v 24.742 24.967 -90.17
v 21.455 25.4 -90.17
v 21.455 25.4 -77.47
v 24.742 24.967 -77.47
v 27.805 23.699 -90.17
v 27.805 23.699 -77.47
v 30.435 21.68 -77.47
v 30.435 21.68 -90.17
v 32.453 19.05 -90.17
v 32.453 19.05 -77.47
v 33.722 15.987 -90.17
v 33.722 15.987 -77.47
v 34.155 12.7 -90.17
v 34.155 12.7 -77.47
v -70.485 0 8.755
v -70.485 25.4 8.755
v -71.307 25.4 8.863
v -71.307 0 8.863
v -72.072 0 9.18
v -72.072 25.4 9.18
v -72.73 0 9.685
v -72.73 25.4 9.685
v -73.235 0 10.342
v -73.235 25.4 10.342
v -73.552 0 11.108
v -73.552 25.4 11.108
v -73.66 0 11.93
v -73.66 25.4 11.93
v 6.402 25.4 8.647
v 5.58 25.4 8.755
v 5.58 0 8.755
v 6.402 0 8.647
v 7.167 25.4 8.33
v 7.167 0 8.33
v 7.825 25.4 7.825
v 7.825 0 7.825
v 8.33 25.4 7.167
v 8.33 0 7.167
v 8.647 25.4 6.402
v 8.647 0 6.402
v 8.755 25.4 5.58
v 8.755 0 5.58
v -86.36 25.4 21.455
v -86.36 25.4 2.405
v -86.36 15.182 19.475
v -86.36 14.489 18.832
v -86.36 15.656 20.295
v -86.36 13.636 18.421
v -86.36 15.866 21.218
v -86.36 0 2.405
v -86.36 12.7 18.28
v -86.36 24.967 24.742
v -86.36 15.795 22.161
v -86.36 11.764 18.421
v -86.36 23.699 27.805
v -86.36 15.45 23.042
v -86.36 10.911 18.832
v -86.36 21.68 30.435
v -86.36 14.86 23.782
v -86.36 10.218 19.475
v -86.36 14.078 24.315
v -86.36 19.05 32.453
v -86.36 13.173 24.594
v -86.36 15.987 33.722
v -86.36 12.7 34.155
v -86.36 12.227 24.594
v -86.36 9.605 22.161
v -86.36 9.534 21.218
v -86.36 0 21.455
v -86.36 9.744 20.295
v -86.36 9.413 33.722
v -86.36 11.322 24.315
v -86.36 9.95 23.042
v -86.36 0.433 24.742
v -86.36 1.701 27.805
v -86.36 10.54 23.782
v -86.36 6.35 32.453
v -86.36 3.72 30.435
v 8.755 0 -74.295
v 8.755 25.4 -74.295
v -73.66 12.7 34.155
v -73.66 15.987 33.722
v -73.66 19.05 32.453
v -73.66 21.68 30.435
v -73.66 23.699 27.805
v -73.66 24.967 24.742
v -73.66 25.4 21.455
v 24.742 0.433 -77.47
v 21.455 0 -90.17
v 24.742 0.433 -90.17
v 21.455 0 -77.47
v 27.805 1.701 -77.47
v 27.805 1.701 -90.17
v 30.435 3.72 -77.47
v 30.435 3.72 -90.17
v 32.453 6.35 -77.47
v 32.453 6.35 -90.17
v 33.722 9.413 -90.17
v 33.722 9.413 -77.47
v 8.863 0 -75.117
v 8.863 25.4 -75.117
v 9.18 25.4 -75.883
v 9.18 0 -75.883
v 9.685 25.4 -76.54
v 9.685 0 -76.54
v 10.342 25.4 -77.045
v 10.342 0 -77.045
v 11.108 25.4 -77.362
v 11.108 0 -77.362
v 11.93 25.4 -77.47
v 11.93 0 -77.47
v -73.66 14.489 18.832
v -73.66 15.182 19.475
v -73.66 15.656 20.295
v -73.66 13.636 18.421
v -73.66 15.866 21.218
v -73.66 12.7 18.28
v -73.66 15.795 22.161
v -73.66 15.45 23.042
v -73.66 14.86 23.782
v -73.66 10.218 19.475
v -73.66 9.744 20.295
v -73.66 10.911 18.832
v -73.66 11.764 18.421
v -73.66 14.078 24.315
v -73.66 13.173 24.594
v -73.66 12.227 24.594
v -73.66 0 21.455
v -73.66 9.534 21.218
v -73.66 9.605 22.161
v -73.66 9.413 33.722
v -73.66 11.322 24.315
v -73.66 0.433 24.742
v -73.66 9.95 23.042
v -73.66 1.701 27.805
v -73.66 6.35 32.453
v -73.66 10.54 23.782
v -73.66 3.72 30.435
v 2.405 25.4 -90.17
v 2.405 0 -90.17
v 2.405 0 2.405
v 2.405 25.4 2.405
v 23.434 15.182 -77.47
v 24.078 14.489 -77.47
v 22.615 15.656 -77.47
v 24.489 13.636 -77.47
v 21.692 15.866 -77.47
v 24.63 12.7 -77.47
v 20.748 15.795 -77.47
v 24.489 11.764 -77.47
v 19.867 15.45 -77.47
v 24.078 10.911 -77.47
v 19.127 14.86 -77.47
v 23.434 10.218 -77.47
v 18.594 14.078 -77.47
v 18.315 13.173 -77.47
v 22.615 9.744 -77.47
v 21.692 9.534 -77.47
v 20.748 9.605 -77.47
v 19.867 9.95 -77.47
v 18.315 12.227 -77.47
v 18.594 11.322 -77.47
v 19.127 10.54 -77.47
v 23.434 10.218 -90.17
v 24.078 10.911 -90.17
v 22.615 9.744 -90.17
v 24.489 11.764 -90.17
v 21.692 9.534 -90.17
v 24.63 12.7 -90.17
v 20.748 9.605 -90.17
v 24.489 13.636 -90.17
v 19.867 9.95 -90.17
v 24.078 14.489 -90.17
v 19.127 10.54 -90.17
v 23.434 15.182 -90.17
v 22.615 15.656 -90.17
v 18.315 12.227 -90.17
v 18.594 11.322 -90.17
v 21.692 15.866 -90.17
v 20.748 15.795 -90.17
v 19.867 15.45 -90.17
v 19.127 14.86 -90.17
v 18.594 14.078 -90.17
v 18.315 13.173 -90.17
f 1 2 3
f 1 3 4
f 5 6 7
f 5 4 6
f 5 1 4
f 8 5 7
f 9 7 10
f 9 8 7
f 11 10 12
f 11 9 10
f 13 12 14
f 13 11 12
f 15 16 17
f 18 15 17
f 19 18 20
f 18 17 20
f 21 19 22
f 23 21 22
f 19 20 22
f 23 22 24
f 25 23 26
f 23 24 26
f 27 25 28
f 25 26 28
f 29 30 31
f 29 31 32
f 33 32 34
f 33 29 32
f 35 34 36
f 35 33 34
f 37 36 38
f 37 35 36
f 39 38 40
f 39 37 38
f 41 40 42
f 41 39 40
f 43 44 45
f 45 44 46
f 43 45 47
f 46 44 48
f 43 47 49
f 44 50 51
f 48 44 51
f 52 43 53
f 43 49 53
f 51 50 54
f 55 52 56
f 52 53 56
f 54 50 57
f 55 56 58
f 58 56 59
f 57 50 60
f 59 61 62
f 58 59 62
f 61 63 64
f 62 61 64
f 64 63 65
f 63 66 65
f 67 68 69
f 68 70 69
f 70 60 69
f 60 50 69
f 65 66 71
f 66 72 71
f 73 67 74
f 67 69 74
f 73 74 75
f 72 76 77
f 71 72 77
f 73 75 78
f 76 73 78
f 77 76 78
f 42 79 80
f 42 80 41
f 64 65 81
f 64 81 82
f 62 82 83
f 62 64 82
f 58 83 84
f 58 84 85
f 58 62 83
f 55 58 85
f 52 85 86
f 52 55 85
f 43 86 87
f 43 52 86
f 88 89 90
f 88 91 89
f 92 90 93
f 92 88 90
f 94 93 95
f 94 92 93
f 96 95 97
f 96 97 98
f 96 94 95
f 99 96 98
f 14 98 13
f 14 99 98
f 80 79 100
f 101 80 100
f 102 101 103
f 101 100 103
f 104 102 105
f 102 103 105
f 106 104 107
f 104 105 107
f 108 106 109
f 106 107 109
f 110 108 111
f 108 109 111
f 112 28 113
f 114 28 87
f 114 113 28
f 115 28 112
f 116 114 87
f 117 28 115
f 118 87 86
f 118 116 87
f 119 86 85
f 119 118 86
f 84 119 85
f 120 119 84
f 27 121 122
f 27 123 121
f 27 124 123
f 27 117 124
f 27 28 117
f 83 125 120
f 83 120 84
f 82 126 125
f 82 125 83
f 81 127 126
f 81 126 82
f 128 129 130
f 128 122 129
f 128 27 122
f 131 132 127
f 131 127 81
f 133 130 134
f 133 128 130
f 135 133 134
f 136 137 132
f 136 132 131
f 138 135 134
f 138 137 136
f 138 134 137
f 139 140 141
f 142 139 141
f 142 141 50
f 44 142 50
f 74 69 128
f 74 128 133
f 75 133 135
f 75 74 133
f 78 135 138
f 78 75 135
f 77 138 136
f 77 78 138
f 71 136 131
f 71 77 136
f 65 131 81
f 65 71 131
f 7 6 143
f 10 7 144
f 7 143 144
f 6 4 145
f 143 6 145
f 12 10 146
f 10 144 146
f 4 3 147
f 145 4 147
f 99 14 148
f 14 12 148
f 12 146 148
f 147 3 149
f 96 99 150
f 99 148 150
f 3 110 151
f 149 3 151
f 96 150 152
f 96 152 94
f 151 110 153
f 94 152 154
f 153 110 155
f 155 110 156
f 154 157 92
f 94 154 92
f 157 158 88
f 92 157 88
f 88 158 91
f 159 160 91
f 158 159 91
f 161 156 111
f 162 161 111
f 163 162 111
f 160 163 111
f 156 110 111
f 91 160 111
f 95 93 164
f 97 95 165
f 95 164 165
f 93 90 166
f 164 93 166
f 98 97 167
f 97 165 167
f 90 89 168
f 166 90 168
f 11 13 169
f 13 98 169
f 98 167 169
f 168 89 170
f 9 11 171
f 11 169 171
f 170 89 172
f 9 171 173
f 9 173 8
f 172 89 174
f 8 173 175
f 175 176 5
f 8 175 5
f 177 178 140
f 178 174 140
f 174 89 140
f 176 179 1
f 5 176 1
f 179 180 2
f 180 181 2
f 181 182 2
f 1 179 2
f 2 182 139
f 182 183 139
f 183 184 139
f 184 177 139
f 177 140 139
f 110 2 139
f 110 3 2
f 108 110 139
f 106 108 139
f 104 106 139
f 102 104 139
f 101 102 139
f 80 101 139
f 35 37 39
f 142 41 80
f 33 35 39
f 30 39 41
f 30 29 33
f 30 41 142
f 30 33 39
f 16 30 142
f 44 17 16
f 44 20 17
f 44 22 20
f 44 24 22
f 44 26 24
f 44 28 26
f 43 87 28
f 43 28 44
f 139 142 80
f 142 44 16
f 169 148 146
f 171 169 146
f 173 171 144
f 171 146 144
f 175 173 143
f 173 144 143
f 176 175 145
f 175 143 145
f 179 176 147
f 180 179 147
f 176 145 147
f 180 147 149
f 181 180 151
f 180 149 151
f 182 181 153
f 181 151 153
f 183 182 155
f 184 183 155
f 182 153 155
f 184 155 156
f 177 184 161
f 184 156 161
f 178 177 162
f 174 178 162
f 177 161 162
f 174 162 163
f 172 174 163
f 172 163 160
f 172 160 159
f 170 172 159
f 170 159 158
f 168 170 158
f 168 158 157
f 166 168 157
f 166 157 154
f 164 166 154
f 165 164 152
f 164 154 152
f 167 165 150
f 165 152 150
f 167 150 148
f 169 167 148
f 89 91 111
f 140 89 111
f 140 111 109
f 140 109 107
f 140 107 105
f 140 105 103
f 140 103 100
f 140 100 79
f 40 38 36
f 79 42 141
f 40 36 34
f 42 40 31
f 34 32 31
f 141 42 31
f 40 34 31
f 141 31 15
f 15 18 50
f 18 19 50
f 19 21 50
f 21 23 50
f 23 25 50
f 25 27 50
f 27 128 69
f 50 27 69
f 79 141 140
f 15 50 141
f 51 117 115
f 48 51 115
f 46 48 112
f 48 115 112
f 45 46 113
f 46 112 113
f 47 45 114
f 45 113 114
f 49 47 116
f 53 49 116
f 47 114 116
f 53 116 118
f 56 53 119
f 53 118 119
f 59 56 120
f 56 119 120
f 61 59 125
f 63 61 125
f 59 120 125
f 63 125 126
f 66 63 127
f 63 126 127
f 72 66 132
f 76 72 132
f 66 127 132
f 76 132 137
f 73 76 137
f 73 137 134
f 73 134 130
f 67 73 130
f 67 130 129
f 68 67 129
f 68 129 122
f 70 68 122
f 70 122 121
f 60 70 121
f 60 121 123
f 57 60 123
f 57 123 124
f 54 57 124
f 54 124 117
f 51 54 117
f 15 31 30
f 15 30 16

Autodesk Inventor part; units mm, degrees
ref_plane "YZ Plane" through (0, 0, 0) normal (1, 0, 0) x (0, 1, 0)
ref_plane "XZ Plane" through (0, 0, 0) normal (0, 1, 0) x (-1, 0, 0)
ref_plane "XY Plane" through (0, 0, 0) normal (0, 0, 1) x (1, 0, 0)
sketch "Sketch1" plane through (0, 0, 0) normal (0, 1, 0) x (-1, 0, 0)
  line L0 (0, 0) -> (86.36, 0)
  line L1 (86.36, 0) -> (86.36, -180.34)
  line L2 (86.36, -180.34) -> (0, -180.34)
  line L3 (0, -180.34) -> (0, 0)
  line L4 (-2.4049, 2.4049) -> (88.7649, 2.4049)
  line L5 (88.7649, 2.4049) -> (88.7649, -182.7449)
  line L6 (88.7649, -182.7449) -> (-2.4049, -182.7449)
  line L7 (-2.4049, -182.7449) -> (-2.4049, 2.4049)
  line L8 (-8.7549, 8.7549) -> (95.1149, 8.7549)
  line L9 (95.1149, 8.7549) -> (95.1149, -189.0949)
  line L10 (95.1149, -189.0949) -> (-8.7549, -189.0949)
  line L11 (-8.7549, -189.0949) -> (-8.7549, 8.7549)
  line L12 (86.36, 0) -> (86.36, 48.8454)
  line L13 (86.36, 48.8454) -> (86.36, -245.5667)
  line L14 (86.36, 8.7549) -> (73.66, 8.7549)
  line L15 (73.66, 8.7549) -> (73.66, 34.1549)
  line L16 (73.66, 34.1549) -> (86.36, 34.1549)
  line L17 (86.36, 34.1549) -> (86.36, 8.7549)
  line L18 (86.36, -189.0949) -> (73.66, -189.0949)
  line L19 (73.66, -189.0949) -> (73.66, -214.4949)
  line L20 (73.66, -214.4949) -> (86.36, -214.4949)
  line L21 (86.36, -214.4949) -> (86.36, -189.0949)
  point P0 (86.36, 34.1549)
  point P1 (73.66, 8.7549)
  point P2 (73.66, -189.0949)
  point P3 (86.36, -214.4949)
  point P4 (86.36, -182.7449)
  point P5 (86.36, 2.4049)
  dimension "d0" = 86.36
  dimension "d1" = 180.34
  dimension "d2" = 6.35
  dimension "d3" = 12.7
  dimension "d4" = 25.4
  dimension "d5" = 12.7
  dimension "d6" = 25.4
extrude "Extrusion1" add sketch "Sketch1" along normal blind 25.4 contours L4 L7 L6 L13 L10 L11 L8 L12 | L8 L15 L16 L12 | L13 L20 L19 L10
fillet "Fillet1" radius 3.175 4 edges at (8.7549, 12.7, 8.7549) (8.7549, 12.7, -189.0949) (-73.66, 12.7, 8.7549) (-73.66, 12.7, -189.0949)
fillet "Fillet2" radius 12.7 4 edges at (-80.01, 25.4, 34.1549) (-80.01, 0, 34.1549) (-80.01, 25.4, -214.4949) (-80.01, 0, -214.4949)
sketch "Sketch2" plane through (-73.66, 0, -192.2699) normal (1, 0, 0) x (0, 0, -1)
  arc A0 (-213.7248, 25.4) -> (-213.7248, 0) centre (-213.7248, 12.7) ccw projected
  line L0 (-213.7248, 0) -> (-204.1998, 0) projected
  line L1 (-204.1998, 25.4) -> (-204.1998, 0) projected
  line L2 (-213.7248, 25.4) -> (-204.1998, 25.4) projected
  arc A1 (9.525, 0) -> (9.525, 25.4) centre (9.525, 12.7) ccw projected
  line L3 (0, 25.4) -> (9.525, 25.4) projected
  line L4 (0, 0) -> (0, 25.4) projected
  line L5 (0, 0) -> (9.525, 0) projected
  circle A2 centre (-213.7248, 12.7) radius 3.175
  circle A3 centre (9.525, 12.7) radius 3.175
  point P0 (-192.2699, 0)
  dimension "d11" = 6.35
  dimension "d12" = 6.35
extrude "Extrusion2" cut sketch "Sketch2" against normal blind 25.4 contours A2 | A3
sketch "Sketch3" plane through (8.7549, 0, 5.5799) normal (1, 0, 0) x (0, 0, -1)
  line L0 (0, 25.4) -> (191.4998, 25.4) projected
  line L1 (95.7499, 25.4) -> (95.7499, 0)
  line L2 (188.3248, 0) -> (3.175, 0) projected
  line L3 (83.0499, 25.4) -> (83.0499, 0)
  point P0 (5.5799, 0)
  point P1 (83.0499, 0)
  dimension "d15" = 12.7
extrude "Extrusion3" add sketch "Sketch3" along normal blind 25.4
sketch "Sketch4" plane through (8.7549, 0, -185.9199) normal (1, 0, 0) x (0, 0, -1)
  line L0 (-3.175, 25.4) -> (-188.3248, 25.4) projected
  line L1 (-95.7499, 25.4) -> (115.4033, 25.4)
  line L2 (115.4033, 25.4) -> (115.4033, -38.5479)
  line L3 (115.4033, -38.5479) -> (-95.7499, -38.5479)
  line L4 (-95.7499, -38.5479) -> (-95.7499, 25.4)
  point P0 (-185.9199, 0)
  point P1 (-3.175, 25.4)
extrude "Extrusion4" cut sketch "Sketch4" along normal through all both and the other way through all
fillet "Fillet3" radius 12.7 2 edges at (34.1549, 25.4, -83.82) (34.1549, 0, -83.82)
fillet "Fillet4" radius 3.175 1 edges at (8.7549, 12.7, -77.47)
sketch "Sketch5" plane through (21.4549, 12.7, -77.47) normal (0, 0, 1) x (1, 0, 0)
  arc A0 (0, -12.7) -> (0, 12.7) centre (0, 0) ccw projected
  circle A1 centre (0, 0) radius 3.175
  point P0 (-21.4549, -12.7)
  dimension "d22" = 6.35
extrude "Extrusion5" cut sketch "Sketch5" against normal blind 25.4
properties part number "Battery mount top" material "Rubber, Silicone"
